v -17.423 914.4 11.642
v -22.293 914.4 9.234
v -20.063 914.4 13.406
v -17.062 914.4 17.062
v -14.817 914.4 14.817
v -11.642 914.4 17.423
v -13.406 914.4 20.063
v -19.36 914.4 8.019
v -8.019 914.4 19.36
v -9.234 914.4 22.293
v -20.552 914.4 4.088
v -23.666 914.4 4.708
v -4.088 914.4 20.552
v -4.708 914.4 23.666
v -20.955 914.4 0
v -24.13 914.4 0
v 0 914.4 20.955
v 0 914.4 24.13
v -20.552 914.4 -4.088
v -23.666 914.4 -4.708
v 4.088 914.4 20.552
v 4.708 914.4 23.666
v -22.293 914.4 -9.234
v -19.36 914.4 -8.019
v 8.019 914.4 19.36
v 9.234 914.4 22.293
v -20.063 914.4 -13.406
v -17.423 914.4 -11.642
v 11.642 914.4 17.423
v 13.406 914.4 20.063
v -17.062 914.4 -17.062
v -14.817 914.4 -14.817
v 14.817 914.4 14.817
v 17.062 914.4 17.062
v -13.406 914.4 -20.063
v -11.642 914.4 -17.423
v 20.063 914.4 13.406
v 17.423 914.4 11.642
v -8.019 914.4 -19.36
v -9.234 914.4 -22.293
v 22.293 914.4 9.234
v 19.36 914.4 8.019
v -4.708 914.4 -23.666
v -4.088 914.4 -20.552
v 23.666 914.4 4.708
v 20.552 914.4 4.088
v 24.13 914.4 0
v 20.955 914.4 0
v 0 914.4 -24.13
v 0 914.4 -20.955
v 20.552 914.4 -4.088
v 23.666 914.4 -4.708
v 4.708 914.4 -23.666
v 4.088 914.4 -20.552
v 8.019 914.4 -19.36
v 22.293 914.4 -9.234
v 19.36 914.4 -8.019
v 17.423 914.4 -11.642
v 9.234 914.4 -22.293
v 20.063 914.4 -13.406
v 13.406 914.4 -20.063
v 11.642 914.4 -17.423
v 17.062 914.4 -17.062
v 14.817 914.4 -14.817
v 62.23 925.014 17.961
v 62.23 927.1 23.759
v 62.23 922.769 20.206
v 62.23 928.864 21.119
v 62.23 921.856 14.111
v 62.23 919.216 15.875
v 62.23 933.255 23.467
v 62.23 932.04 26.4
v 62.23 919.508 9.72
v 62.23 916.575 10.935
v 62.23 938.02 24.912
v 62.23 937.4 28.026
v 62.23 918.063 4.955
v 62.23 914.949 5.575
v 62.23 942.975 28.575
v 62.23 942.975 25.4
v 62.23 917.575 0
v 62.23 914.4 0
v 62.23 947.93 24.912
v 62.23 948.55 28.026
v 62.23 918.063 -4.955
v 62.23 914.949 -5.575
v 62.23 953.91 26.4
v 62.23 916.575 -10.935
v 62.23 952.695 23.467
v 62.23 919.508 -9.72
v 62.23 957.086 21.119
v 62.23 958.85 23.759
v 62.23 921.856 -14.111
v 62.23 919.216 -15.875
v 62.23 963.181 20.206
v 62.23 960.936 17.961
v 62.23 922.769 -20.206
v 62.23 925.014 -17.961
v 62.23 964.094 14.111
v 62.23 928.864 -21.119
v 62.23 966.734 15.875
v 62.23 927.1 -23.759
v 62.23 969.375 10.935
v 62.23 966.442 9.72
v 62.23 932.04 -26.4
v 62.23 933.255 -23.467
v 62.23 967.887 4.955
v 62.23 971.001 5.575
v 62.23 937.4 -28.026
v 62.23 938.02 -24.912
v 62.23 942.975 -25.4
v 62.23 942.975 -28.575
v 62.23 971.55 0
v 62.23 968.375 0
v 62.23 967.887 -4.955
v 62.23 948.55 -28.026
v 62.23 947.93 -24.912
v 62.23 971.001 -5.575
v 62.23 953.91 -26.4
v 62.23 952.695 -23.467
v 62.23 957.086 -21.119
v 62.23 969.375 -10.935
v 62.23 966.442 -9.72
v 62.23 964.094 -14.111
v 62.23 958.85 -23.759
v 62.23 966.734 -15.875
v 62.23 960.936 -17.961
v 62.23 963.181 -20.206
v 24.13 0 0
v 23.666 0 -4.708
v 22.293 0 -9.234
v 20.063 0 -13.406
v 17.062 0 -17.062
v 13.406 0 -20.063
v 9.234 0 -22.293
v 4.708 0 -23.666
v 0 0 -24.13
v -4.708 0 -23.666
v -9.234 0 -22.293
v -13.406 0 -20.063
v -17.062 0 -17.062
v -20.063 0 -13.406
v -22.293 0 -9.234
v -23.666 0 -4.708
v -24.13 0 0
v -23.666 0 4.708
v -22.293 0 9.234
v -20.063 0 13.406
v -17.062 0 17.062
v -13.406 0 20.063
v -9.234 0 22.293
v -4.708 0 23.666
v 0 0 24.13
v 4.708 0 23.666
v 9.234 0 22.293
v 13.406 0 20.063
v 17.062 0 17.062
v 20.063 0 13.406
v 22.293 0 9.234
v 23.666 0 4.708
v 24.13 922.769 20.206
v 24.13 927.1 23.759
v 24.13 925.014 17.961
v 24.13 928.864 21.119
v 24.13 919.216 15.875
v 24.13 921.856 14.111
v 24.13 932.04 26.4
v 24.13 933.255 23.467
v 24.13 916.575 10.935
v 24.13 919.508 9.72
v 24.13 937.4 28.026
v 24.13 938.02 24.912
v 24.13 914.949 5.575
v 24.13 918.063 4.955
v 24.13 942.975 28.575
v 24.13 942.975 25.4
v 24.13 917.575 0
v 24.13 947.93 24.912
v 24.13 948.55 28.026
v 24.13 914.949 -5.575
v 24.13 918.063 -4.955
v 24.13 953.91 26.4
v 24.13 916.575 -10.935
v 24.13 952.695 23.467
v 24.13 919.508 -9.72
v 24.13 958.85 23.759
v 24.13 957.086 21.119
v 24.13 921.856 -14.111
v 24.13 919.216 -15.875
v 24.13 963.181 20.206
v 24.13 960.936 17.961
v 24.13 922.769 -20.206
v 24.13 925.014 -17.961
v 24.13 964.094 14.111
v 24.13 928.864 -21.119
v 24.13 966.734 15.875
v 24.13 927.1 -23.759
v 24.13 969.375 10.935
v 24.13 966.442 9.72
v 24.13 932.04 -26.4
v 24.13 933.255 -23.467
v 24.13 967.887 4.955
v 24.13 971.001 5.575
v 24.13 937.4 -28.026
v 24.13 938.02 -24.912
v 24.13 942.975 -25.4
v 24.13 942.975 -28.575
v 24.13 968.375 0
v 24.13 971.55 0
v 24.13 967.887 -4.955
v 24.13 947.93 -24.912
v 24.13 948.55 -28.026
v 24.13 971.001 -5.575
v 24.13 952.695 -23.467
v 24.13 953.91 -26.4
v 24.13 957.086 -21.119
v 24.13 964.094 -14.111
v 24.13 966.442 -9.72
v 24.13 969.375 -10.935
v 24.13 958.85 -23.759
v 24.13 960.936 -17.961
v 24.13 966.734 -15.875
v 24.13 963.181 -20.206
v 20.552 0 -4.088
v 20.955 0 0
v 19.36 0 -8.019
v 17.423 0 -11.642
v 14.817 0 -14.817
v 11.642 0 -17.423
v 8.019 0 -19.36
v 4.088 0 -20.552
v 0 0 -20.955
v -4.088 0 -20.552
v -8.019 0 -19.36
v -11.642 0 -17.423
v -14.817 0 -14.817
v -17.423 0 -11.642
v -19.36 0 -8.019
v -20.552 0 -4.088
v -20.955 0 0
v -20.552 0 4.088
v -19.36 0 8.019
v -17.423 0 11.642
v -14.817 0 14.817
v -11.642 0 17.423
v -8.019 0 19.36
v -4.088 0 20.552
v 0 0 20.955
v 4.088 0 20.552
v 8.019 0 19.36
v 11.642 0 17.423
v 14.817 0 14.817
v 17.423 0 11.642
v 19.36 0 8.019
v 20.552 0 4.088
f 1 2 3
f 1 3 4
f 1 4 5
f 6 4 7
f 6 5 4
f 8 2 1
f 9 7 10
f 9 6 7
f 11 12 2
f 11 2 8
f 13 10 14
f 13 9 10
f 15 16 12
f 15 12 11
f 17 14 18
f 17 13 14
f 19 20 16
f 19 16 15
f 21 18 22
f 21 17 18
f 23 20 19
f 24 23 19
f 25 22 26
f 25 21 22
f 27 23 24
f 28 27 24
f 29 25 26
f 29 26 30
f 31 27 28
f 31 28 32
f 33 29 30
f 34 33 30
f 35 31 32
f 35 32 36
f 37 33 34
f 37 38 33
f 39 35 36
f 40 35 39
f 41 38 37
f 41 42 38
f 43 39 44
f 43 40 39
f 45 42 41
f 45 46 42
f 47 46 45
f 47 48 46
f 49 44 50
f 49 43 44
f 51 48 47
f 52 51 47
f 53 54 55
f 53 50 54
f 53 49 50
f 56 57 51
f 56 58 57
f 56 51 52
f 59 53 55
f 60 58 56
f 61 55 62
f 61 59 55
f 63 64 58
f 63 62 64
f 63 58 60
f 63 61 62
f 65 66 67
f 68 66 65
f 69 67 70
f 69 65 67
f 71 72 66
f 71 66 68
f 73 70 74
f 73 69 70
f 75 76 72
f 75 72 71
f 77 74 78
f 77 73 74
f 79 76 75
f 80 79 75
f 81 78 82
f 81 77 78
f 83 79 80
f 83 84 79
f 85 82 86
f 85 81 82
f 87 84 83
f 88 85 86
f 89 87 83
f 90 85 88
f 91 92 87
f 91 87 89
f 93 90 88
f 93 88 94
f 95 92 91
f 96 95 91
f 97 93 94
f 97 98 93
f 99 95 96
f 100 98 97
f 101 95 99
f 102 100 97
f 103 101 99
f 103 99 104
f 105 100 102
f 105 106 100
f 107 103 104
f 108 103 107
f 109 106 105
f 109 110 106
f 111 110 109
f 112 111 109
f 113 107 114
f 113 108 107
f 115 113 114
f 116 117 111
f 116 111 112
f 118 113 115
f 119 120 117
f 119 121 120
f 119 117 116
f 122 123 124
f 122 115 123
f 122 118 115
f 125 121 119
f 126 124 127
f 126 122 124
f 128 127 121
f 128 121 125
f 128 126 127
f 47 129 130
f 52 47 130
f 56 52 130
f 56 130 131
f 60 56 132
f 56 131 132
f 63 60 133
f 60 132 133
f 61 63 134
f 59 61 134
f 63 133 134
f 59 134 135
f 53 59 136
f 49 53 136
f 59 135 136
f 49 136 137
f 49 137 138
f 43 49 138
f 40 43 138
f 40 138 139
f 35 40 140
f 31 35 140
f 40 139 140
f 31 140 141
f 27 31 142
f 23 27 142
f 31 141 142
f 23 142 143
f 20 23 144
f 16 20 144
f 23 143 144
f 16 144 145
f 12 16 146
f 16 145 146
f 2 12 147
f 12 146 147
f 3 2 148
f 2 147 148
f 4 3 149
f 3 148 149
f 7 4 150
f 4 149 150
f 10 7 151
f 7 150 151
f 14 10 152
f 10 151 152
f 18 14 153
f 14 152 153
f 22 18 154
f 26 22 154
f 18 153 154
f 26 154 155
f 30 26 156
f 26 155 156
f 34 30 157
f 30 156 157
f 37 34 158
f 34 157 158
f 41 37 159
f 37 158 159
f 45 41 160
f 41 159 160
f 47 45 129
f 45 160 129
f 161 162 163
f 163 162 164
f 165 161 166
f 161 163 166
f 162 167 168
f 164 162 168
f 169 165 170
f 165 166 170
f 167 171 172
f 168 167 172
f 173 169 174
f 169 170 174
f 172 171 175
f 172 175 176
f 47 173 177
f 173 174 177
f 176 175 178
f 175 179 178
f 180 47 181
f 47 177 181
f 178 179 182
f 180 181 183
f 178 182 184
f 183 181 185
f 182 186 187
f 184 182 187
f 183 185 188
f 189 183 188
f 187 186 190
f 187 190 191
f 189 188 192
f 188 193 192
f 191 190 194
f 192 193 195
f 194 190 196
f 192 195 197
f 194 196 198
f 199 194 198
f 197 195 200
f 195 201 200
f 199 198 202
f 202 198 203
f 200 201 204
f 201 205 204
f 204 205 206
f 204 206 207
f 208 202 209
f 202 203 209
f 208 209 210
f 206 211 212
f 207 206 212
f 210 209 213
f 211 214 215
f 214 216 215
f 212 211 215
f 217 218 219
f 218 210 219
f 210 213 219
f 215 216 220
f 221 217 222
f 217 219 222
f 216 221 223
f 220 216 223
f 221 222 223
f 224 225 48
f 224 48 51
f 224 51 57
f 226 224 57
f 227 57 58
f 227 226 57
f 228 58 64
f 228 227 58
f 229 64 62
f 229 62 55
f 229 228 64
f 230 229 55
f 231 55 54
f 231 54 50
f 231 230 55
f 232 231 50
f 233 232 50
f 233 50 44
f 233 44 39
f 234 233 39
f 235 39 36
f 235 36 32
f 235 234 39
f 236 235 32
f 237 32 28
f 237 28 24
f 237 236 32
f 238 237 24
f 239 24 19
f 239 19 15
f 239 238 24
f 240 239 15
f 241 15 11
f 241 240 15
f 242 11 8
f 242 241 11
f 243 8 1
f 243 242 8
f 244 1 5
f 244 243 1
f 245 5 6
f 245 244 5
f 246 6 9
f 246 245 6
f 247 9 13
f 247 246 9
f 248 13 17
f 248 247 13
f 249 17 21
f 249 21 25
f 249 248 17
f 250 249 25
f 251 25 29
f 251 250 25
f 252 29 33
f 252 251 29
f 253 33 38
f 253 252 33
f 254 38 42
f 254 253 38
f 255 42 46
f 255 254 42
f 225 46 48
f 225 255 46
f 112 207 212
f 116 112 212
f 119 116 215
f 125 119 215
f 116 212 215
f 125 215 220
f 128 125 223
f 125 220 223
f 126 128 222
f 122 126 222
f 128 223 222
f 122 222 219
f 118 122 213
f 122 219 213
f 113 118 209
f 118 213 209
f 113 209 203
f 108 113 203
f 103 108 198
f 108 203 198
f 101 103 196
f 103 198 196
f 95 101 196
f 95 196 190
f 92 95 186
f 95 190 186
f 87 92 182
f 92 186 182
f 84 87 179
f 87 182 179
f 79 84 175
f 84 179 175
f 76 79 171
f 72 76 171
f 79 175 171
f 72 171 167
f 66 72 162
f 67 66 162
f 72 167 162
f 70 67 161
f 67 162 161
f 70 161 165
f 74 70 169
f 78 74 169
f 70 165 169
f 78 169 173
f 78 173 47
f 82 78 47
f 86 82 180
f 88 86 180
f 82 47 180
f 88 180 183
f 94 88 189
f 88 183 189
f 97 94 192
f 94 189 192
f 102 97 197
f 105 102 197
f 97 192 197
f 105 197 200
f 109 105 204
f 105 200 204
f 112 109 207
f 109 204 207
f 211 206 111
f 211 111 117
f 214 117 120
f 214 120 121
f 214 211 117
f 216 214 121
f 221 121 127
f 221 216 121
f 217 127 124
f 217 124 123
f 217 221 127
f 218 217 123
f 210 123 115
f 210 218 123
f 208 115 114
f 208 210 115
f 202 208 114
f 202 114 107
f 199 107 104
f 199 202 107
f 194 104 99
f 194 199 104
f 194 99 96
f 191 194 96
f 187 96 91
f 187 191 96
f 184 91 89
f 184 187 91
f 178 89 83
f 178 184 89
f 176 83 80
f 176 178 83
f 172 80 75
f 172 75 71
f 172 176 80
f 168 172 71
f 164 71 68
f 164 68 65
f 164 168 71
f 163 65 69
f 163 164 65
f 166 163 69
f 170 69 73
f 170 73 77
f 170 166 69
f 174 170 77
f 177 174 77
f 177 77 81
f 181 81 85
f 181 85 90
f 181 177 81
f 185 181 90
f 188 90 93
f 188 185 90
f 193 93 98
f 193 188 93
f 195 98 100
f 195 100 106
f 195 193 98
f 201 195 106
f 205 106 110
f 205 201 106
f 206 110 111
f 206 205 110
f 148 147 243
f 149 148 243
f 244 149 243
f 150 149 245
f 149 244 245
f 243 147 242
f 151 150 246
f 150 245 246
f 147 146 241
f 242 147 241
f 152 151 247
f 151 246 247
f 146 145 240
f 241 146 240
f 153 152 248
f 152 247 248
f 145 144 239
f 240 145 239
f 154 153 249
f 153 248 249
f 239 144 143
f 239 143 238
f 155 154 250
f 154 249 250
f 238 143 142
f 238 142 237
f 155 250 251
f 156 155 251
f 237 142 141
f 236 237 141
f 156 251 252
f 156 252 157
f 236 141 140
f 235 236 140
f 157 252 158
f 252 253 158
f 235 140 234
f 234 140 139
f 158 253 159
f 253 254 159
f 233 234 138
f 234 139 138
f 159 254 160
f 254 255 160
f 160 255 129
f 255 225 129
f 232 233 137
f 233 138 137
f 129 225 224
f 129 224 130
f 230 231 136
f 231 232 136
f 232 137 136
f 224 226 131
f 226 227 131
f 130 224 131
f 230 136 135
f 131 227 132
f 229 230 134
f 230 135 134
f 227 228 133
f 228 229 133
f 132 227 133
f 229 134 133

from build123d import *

# Parameters (mm, degrees)
SKETCH1_R           = 24.13
SKETCH1_R_2         = 20.955
BOSS_EXTRUDE1_DEPTH = 914.4
BOSS_EXTRUDE2_START = 24.13
SKETCH2_R           = 28.575
SKETCH2_R_2         = 25.4
BOSS_EXTRUDE2_DEPTH = 38.1


with BuildPart() as part:
    # Sketch1 → Boss-Extrude1 (new body)
    with BuildSketch(Plane(origin=(0, 0, 0), x_dir=(1, 0, 0), z_dir=(0, 1, 0))):
        Circle(SKETCH1_R)
        Circle(SKETCH1_R_2, mode=Mode.SUBTRACT)
    extrude(amount=BOSS_EXTRUDE1_DEPTH)


with BuildPart() as body_2:
    # Sketch2 → Boss-Extrude2 (new body)
    with BuildSketch(Plane(origin=(0, 0, 0), x_dir=(0, 0, -1), z_dir=(1, 0, 0)).offset(BOSS_EXTRUDE2_START)):
        with Locations((0, 942.975)):
            Circle(SKETCH2_R)
        with Locations((0, 942.975)):
            Circle(SKETCH2_R_2, mode=Mode.SUBTRACT)
    extrude(amount=BOSS_EXTRUDE2_DEPTH)


solid = Compound([part.part, body_2.part])
